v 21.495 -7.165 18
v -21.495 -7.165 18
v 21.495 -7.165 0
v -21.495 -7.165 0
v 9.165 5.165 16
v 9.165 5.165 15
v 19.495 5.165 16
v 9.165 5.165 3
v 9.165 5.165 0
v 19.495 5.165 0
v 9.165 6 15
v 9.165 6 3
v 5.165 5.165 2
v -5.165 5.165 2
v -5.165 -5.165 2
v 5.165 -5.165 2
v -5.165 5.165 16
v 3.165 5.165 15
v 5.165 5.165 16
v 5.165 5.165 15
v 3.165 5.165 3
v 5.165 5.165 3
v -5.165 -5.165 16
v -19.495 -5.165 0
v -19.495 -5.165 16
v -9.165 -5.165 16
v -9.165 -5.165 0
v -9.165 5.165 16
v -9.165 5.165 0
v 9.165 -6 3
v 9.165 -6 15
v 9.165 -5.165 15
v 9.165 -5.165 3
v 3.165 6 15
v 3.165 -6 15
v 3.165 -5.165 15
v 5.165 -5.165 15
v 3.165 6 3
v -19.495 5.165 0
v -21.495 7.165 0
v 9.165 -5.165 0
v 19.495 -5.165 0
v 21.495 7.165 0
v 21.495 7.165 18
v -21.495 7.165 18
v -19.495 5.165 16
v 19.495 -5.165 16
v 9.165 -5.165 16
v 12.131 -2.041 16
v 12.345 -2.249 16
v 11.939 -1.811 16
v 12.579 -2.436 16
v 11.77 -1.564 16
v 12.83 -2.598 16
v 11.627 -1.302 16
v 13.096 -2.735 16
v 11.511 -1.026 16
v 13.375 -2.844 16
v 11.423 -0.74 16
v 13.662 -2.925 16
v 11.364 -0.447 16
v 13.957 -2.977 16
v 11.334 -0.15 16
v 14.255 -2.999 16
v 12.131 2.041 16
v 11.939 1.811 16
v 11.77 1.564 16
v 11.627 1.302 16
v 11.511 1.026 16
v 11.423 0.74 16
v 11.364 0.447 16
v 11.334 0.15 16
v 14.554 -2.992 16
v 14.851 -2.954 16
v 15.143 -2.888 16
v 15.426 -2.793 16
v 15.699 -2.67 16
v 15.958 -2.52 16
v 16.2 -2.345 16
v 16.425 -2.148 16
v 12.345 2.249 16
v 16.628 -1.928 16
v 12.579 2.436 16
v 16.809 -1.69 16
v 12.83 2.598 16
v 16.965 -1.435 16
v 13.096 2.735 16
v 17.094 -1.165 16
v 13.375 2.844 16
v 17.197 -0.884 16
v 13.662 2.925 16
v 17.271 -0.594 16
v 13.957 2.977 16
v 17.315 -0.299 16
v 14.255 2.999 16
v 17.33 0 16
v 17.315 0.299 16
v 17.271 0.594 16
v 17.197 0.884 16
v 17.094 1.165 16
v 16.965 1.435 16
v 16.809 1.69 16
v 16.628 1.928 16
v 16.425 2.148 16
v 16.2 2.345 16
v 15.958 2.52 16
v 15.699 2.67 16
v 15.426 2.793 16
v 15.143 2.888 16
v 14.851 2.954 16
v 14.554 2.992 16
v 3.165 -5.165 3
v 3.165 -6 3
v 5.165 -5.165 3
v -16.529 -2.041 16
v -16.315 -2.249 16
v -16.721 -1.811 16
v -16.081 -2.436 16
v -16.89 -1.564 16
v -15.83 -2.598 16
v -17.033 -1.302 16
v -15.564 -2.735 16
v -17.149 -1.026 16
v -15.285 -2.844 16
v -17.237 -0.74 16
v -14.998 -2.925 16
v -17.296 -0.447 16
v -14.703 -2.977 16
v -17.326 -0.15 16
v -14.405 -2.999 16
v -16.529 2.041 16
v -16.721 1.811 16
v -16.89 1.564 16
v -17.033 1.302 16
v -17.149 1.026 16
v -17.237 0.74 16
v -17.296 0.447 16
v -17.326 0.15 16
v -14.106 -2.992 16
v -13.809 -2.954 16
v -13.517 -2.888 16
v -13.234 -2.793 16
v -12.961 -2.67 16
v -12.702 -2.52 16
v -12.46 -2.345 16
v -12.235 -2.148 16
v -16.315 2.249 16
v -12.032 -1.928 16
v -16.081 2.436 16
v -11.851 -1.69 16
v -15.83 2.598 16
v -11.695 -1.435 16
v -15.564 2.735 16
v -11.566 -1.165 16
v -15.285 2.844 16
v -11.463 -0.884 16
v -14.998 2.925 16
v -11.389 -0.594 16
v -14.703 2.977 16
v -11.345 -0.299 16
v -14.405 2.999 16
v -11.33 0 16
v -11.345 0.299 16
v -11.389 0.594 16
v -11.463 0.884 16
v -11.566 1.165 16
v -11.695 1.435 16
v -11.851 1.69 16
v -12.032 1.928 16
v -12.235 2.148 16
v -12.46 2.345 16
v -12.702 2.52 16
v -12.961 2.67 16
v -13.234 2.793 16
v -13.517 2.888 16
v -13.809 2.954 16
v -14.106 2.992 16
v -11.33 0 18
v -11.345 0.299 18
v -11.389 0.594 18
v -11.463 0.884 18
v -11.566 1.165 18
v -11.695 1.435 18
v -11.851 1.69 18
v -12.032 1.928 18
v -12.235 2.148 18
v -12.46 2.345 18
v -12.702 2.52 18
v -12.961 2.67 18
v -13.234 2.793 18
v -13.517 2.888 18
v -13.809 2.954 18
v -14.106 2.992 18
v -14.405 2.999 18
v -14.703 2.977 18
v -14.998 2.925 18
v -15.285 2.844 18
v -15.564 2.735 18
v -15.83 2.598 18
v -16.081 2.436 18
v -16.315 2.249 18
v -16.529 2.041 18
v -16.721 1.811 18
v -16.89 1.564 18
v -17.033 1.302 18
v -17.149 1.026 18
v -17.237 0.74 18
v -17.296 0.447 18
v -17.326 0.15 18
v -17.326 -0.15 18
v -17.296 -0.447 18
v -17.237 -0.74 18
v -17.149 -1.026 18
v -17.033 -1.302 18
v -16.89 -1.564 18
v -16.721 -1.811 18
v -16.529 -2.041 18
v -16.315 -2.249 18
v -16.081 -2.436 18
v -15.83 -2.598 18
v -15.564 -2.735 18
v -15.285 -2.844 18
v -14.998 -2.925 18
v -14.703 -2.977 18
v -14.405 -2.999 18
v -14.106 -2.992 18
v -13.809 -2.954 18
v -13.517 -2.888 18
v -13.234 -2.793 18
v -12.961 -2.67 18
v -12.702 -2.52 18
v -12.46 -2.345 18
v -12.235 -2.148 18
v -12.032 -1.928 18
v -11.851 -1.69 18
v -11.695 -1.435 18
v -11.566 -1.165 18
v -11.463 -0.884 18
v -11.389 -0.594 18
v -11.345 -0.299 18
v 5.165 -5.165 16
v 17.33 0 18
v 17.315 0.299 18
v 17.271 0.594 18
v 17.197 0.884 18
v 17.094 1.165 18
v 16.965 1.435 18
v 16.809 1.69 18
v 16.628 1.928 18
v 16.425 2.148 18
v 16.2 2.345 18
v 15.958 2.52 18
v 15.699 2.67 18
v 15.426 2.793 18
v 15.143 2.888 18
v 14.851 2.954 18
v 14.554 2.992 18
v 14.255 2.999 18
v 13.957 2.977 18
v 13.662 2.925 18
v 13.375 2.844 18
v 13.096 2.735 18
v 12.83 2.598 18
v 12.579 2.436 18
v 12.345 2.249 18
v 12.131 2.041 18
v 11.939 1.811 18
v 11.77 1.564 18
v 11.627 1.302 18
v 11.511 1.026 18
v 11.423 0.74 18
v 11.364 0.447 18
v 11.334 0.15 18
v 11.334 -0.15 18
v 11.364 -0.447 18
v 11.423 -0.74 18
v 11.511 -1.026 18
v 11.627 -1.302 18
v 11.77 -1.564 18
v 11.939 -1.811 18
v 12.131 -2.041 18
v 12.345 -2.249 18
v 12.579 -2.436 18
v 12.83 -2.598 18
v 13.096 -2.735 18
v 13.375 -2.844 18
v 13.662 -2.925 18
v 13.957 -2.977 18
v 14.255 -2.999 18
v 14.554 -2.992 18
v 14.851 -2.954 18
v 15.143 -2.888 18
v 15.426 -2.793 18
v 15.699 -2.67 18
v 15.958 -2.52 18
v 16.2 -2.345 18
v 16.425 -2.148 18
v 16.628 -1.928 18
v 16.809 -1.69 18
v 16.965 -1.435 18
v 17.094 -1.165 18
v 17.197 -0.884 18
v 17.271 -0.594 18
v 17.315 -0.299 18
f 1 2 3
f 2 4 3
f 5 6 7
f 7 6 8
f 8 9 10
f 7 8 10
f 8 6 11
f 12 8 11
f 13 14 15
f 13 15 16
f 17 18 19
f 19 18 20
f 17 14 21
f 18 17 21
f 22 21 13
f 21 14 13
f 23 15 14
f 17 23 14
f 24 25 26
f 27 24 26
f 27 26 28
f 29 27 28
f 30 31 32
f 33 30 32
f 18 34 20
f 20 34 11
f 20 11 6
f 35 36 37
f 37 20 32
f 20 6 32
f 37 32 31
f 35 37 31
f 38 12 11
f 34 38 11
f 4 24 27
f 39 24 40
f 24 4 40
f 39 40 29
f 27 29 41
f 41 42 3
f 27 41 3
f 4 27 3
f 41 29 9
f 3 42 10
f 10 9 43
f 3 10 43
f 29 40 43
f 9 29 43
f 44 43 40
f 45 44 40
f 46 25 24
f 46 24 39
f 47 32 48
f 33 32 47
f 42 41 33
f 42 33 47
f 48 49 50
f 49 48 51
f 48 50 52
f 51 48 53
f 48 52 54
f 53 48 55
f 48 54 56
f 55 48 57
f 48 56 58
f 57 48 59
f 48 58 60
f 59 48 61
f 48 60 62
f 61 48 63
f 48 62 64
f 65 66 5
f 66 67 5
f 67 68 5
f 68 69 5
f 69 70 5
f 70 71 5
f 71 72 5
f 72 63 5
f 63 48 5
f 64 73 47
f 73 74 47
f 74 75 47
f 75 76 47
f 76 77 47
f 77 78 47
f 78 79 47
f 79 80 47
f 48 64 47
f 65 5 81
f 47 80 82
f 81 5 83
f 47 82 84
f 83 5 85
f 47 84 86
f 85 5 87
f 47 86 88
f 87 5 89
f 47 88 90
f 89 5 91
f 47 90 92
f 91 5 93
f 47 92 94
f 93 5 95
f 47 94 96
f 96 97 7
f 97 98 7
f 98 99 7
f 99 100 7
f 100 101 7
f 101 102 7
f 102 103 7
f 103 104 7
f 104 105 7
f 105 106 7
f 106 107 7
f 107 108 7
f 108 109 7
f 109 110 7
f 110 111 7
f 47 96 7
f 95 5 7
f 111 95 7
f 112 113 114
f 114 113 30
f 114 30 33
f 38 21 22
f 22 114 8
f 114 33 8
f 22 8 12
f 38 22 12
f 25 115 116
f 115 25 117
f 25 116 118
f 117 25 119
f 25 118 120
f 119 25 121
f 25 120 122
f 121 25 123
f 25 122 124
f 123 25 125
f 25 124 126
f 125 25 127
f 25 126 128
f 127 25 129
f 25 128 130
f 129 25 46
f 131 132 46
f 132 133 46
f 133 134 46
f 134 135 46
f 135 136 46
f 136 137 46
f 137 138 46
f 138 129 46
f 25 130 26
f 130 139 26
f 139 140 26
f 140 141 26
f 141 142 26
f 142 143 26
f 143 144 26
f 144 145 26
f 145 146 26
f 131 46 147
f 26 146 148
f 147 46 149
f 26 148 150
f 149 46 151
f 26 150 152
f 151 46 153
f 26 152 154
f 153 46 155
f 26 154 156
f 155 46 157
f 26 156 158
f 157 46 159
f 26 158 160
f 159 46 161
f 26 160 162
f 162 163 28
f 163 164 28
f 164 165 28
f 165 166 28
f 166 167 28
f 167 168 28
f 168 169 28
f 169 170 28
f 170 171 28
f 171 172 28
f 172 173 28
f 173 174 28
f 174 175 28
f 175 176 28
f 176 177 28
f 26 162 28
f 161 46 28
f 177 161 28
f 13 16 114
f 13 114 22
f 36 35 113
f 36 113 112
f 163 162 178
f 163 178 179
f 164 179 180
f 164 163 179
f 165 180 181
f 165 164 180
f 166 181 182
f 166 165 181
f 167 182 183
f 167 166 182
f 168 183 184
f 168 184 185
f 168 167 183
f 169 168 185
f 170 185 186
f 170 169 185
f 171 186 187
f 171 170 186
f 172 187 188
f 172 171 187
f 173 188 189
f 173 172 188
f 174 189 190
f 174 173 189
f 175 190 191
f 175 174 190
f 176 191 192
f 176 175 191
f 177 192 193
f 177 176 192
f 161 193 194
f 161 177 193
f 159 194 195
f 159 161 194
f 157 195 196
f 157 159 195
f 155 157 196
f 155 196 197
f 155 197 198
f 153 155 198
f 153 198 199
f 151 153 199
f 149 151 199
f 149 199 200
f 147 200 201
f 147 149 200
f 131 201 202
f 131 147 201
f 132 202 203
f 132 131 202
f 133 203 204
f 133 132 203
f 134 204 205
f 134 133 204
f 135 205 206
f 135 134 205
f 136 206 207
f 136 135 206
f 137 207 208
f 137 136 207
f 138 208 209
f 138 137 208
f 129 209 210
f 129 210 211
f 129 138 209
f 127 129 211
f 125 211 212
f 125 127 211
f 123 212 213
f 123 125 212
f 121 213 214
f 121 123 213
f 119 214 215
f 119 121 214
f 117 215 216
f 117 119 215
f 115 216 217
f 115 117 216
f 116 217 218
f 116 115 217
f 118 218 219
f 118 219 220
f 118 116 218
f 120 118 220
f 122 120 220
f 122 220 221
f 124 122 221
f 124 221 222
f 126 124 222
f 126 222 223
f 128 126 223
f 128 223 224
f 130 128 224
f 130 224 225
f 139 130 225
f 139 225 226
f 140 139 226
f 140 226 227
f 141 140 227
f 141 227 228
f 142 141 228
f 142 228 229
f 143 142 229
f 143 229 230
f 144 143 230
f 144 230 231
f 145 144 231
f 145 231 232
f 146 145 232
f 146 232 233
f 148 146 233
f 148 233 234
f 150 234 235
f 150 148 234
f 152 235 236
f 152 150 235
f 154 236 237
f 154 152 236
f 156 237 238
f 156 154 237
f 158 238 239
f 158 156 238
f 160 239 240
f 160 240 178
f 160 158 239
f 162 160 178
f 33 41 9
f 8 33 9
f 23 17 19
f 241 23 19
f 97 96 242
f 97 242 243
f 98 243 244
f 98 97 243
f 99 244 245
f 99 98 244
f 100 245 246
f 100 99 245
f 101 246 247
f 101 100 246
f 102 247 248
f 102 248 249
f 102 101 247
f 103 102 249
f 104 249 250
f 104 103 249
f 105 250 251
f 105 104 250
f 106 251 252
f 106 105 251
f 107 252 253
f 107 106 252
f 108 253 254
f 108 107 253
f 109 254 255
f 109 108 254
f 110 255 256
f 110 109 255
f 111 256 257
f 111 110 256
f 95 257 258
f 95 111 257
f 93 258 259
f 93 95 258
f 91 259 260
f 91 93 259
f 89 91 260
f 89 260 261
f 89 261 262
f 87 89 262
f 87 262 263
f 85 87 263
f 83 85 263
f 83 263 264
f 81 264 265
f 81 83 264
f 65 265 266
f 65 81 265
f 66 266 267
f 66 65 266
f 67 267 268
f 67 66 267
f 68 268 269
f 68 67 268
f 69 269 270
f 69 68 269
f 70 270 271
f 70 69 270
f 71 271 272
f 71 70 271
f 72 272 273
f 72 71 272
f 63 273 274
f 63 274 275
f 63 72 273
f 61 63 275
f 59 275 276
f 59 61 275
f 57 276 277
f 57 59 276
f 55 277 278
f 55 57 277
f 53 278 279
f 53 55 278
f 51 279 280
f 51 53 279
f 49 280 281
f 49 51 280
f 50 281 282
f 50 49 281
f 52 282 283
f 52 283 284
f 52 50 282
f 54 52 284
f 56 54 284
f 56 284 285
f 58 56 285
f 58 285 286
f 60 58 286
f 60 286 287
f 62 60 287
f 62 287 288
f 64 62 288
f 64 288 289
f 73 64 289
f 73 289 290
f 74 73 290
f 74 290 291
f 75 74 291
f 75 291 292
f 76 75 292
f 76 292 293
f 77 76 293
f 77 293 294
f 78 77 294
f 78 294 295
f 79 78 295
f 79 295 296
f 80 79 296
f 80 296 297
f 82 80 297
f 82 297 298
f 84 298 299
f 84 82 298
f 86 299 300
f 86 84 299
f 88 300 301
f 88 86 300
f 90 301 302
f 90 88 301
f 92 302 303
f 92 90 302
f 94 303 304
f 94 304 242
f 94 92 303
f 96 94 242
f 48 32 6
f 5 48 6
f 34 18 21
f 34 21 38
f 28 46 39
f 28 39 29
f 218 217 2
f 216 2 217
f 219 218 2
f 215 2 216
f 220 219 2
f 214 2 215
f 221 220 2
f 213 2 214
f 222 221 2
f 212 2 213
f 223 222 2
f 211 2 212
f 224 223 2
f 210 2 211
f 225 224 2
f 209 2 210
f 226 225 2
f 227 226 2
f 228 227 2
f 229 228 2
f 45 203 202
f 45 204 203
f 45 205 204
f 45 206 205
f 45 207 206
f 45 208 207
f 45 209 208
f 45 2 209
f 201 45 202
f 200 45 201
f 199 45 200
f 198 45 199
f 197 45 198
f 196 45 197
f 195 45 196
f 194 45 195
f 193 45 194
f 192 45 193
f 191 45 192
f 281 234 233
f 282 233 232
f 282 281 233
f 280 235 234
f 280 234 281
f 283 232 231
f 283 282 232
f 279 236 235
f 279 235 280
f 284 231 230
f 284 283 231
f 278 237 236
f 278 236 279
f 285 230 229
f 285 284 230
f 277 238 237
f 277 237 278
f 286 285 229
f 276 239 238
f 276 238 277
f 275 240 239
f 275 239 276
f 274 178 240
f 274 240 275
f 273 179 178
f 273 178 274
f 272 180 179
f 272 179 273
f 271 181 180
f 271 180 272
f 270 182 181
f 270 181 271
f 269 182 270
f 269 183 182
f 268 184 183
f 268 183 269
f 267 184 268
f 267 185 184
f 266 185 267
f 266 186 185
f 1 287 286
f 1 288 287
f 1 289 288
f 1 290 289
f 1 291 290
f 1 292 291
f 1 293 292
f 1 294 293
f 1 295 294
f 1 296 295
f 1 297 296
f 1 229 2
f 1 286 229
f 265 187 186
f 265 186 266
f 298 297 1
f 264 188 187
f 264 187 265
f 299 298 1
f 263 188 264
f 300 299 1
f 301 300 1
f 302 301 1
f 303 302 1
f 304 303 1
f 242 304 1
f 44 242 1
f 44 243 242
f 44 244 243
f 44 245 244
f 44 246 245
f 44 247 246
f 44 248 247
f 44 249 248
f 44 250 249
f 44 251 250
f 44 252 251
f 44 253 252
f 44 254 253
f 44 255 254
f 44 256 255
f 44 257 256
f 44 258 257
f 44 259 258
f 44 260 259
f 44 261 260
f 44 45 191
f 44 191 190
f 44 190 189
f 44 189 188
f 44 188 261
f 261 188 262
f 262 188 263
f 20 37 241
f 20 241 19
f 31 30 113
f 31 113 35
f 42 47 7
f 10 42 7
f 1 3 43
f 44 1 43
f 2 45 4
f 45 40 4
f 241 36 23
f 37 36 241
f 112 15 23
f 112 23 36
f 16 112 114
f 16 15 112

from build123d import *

# Parameters (mm, degrees)
F0_W     = 14.33
F0_H     = 14.33
F0_W_2   = 10.33
F0_H_2   = 10.33
F0_W_3   = 6.33
F0_H_3   = 6.33
F1_DEPTH = 2
F2_W     = 10.33
F2_H     = 10.33
F3_DEPTH = 14
F4_R     = 3
F5_DEPTH = 2
F6_W     = 0.835
F6_H     = 12
F6_W_2   = 10.33
F7_DEPTH = 6


with BuildPart() as f1:
    # F0 (on Top) → F1 (new body)
    with BuildSketch(Plane.XY):
        with Locations((-14.33, 0)):
            Rectangle(F0_W, F0_H)
        with Locations((-14.33, 0)):
            Rectangle(F0_W_2, F0_H_2, mode=Mode.SUBTRACT)
        Rectangle(F0_W, F0_H)
        Rectangle(F0_W_2, F0_H_2, mode=Mode.SUBTRACT)
        Rectangle(F0_W_2, F0_H_2)
        Rectangle(F0_W_3, F0_H_3, mode=Mode.SUBTRACT)
        Rectangle(F0_W_3, F0_H_3)
        with Locations((14.33, 0)):
            Rectangle(F0_W, F0_H)
        with Locations((14.33, 0)):
            Rectangle(F0_W_2, F0_H_2, mode=Mode.SUBTRACT)
    extrude(amount=F1_DEPTH)

    # F2 (on face) → F3 (join)
    with BuildSketch(Plane.XY.offset(2)):
        Polygon((-7.165, 7.165), (-21.495, 7.165), (-21.495, -7.165), (-7.165, -7.165), (7.165, -7.165), (21.495, -7.165), (21.495, 7.165), (7.165, 7.165), align=None)
        with Locations((-14.33, 0)):
            Rectangle(F2_W, F2_H, mode=Mode.SUBTRACT)
        Rectangle(F2_W, F2_H, mode=Mode.SUBTRACT)
        with Locations((14.33, 0)):
            Rectangle(F2_W, F2_H, mode=Mode.SUBTRACT)
    extrude(amount=F3_DEPTH)

    # F4 (on face) → F5 (join)
    with BuildSketch(Plane.XY.offset(16)):
        Polygon((21.495, 7.165), (7.165, 7.165), (-7.165, 7.165), (-21.495, 7.165), (-21.495, -7.165), (-7.165, -7.165), (7.165, -7.165), (21.495, -7.165), align=None)
        with Locations((-14.33, 0)):
            Circle(F4_R, mode=Mode.SUBTRACT)
        with Locations((14.33, 0)):
            Circle(F4_R, mode=Mode.SUBTRACT)
    extrude(amount=F5_DEPTH)

    # F6 (on face) → F7 (cut)
    with BuildSketch(Plane.YZ.offset(9.165)):
        with Locations((-5.5825, 9)):
            Rectangle(F6_W, F6_H)
        with Locations((0, 9)):
            Rectangle(F6_W_2, F6_H)
        with Locations((5.5825, 9)):
            Rectangle(F6_W, F6_H)
    extrude(amount=-F7_DEPTH, mode=Mode.SUBTRACT)


solid = f1.part
